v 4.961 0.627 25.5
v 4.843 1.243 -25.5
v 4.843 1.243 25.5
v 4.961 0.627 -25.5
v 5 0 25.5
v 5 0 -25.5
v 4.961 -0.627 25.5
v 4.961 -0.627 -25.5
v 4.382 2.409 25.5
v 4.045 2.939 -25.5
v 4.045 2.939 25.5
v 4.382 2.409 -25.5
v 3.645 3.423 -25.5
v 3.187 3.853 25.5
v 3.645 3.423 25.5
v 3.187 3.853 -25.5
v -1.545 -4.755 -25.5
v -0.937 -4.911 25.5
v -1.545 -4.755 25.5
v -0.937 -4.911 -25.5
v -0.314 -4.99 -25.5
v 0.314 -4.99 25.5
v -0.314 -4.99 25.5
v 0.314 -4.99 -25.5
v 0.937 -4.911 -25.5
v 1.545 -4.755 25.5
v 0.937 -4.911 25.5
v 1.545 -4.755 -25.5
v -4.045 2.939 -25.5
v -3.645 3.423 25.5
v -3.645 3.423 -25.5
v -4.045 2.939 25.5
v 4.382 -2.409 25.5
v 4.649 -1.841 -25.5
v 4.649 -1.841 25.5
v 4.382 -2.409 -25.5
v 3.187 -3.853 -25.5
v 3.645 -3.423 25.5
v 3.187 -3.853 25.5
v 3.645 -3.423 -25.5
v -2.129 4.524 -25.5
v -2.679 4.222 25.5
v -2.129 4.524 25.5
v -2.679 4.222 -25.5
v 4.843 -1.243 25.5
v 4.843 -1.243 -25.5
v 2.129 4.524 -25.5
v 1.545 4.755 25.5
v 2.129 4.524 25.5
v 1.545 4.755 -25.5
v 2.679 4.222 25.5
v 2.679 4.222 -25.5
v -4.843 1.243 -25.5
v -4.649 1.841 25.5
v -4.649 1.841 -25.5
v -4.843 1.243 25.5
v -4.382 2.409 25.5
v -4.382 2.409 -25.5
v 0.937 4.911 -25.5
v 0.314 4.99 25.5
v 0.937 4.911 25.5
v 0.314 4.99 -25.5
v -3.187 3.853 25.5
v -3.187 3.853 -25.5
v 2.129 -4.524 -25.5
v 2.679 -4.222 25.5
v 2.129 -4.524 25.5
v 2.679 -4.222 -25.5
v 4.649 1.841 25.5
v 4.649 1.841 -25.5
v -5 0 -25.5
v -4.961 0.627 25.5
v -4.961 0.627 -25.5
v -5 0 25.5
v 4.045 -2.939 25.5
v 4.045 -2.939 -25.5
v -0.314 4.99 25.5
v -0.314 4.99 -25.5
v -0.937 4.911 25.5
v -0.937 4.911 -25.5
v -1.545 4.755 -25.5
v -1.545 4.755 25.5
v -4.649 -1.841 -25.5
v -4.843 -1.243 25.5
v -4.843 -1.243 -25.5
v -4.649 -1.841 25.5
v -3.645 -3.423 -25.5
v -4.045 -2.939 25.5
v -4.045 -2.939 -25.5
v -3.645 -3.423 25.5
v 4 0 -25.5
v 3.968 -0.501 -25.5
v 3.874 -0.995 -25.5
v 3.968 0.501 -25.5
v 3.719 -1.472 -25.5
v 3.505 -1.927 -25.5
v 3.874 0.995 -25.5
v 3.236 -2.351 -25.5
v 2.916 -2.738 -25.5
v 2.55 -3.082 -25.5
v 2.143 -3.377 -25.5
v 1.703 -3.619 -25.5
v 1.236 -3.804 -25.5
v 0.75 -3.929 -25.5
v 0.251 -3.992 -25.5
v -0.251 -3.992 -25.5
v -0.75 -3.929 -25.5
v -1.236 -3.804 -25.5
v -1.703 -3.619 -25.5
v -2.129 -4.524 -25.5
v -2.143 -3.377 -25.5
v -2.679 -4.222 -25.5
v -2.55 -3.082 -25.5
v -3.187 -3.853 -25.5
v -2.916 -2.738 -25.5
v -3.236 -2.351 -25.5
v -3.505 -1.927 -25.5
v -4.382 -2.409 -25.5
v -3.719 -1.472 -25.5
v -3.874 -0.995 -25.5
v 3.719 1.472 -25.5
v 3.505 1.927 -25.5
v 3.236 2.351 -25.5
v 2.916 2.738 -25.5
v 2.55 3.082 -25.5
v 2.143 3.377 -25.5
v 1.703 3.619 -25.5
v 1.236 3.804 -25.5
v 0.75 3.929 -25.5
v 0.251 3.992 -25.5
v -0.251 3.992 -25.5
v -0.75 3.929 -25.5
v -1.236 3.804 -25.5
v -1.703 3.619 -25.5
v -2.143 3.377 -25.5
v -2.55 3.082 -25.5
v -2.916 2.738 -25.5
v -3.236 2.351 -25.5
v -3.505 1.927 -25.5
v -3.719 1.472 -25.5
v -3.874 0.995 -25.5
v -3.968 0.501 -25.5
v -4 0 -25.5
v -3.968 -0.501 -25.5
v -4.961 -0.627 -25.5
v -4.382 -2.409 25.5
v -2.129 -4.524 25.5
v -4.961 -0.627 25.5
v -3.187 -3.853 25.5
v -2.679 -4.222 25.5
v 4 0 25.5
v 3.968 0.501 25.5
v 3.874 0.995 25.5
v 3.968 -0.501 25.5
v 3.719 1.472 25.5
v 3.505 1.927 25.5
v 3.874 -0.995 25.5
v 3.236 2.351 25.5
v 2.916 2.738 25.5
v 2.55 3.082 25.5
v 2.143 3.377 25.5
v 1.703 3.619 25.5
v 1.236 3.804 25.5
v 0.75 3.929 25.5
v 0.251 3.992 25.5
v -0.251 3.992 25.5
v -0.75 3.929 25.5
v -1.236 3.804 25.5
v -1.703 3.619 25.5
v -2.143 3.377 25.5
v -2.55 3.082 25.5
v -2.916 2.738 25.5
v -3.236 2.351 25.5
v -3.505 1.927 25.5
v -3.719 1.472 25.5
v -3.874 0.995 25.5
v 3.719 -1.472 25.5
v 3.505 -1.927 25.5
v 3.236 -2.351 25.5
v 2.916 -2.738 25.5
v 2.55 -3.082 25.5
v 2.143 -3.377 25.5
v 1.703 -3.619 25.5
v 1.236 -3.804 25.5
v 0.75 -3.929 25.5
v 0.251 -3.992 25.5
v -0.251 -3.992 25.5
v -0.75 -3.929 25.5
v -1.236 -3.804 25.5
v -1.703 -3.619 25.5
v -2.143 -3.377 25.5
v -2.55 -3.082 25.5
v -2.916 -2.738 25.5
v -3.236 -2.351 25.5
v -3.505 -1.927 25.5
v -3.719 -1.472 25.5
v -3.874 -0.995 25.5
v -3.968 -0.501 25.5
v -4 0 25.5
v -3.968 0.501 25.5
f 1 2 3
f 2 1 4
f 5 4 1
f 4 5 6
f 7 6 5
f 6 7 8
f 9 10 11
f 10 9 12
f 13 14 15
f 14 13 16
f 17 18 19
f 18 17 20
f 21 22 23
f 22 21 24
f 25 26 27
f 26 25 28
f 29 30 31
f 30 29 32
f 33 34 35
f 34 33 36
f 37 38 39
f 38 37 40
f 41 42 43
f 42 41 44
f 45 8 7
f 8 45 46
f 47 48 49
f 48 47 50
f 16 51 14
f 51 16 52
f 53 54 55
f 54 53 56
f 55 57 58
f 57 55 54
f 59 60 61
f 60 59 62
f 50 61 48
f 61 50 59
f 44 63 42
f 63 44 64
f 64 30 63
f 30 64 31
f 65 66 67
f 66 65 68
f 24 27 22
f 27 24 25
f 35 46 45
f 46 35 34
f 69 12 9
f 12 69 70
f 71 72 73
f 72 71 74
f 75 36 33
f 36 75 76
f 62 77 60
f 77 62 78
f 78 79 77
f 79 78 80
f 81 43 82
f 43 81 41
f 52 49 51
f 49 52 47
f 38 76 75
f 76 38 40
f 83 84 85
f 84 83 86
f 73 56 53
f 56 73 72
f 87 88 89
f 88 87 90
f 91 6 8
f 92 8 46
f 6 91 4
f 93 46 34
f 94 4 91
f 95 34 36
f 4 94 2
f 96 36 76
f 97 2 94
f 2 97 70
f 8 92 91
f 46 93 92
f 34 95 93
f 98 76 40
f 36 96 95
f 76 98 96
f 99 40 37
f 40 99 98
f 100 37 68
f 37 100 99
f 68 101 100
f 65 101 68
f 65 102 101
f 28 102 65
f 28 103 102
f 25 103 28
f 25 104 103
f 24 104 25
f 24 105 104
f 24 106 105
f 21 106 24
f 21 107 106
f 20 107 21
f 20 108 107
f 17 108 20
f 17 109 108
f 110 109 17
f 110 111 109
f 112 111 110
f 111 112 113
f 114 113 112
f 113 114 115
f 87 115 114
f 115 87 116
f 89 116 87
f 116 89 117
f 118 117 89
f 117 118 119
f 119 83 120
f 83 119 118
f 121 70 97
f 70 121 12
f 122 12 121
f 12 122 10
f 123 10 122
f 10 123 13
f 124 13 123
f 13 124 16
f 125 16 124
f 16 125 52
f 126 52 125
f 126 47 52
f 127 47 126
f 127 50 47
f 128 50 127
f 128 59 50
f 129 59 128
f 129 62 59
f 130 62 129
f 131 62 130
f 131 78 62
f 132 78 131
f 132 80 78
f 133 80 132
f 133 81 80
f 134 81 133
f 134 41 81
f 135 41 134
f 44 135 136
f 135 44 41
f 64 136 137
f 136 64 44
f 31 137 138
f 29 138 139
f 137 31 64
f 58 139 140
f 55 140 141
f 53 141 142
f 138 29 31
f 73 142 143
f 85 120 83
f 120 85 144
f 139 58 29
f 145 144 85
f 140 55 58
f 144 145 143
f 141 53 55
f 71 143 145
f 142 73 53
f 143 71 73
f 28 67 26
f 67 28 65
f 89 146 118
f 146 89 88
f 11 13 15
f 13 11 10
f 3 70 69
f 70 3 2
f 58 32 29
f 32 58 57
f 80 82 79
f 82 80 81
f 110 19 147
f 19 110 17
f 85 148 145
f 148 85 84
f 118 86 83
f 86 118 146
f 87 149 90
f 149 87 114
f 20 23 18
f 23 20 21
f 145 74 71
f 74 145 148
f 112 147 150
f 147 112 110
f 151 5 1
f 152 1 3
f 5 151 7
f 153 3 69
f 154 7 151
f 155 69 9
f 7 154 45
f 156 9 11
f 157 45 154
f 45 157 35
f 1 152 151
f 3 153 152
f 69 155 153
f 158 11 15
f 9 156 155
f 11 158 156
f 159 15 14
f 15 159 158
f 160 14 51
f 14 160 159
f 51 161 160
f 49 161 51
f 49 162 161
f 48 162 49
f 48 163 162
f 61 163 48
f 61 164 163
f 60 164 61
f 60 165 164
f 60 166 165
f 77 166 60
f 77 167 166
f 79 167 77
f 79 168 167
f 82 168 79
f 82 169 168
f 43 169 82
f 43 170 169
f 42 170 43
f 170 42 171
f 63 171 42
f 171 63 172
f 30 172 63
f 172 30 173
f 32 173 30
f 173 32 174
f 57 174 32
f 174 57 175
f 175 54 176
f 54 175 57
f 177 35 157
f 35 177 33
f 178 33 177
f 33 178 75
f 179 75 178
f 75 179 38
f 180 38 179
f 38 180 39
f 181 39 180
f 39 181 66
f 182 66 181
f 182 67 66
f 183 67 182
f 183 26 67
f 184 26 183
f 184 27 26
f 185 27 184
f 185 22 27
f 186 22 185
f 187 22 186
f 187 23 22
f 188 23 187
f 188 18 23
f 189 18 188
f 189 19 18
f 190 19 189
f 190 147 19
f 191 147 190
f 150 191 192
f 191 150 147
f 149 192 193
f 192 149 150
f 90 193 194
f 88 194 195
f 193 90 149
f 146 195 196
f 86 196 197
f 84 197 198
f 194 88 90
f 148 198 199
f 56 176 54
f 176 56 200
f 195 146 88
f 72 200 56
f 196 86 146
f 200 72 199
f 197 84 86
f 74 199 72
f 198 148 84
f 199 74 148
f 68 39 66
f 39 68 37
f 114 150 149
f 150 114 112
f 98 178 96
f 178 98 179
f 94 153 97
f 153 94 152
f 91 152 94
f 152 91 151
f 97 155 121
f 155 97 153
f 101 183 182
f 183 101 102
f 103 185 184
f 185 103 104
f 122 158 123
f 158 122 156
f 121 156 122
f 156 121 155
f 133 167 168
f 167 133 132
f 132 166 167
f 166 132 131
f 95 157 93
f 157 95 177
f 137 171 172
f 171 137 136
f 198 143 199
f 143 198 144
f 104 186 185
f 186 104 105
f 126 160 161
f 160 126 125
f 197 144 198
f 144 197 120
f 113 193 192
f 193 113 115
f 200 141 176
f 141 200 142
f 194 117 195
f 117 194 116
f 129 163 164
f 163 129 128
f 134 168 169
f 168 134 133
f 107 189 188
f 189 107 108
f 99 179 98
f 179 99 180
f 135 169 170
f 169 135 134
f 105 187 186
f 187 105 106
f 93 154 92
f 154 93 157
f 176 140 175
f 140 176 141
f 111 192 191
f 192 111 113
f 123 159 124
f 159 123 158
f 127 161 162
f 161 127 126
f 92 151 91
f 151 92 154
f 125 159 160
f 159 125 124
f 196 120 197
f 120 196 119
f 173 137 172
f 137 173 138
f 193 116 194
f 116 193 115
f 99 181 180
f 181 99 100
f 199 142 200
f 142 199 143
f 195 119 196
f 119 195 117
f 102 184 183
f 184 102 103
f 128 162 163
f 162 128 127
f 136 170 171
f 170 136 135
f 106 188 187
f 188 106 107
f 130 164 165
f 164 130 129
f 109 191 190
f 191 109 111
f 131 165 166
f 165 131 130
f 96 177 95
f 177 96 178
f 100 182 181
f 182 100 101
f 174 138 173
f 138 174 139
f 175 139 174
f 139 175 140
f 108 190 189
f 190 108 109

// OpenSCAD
$fn = 50;


difference() {
	union() {
		translate(v = [0, 0, -25.5000000000]) {
			cylinder(h = 51, r = 5.0000000000);
		}
	}
	union() {
		translate(v = [0, 0, -100.0000000000]) {
			cylinder(h = 200, r = 4.0000000000);
		}
	}
}
